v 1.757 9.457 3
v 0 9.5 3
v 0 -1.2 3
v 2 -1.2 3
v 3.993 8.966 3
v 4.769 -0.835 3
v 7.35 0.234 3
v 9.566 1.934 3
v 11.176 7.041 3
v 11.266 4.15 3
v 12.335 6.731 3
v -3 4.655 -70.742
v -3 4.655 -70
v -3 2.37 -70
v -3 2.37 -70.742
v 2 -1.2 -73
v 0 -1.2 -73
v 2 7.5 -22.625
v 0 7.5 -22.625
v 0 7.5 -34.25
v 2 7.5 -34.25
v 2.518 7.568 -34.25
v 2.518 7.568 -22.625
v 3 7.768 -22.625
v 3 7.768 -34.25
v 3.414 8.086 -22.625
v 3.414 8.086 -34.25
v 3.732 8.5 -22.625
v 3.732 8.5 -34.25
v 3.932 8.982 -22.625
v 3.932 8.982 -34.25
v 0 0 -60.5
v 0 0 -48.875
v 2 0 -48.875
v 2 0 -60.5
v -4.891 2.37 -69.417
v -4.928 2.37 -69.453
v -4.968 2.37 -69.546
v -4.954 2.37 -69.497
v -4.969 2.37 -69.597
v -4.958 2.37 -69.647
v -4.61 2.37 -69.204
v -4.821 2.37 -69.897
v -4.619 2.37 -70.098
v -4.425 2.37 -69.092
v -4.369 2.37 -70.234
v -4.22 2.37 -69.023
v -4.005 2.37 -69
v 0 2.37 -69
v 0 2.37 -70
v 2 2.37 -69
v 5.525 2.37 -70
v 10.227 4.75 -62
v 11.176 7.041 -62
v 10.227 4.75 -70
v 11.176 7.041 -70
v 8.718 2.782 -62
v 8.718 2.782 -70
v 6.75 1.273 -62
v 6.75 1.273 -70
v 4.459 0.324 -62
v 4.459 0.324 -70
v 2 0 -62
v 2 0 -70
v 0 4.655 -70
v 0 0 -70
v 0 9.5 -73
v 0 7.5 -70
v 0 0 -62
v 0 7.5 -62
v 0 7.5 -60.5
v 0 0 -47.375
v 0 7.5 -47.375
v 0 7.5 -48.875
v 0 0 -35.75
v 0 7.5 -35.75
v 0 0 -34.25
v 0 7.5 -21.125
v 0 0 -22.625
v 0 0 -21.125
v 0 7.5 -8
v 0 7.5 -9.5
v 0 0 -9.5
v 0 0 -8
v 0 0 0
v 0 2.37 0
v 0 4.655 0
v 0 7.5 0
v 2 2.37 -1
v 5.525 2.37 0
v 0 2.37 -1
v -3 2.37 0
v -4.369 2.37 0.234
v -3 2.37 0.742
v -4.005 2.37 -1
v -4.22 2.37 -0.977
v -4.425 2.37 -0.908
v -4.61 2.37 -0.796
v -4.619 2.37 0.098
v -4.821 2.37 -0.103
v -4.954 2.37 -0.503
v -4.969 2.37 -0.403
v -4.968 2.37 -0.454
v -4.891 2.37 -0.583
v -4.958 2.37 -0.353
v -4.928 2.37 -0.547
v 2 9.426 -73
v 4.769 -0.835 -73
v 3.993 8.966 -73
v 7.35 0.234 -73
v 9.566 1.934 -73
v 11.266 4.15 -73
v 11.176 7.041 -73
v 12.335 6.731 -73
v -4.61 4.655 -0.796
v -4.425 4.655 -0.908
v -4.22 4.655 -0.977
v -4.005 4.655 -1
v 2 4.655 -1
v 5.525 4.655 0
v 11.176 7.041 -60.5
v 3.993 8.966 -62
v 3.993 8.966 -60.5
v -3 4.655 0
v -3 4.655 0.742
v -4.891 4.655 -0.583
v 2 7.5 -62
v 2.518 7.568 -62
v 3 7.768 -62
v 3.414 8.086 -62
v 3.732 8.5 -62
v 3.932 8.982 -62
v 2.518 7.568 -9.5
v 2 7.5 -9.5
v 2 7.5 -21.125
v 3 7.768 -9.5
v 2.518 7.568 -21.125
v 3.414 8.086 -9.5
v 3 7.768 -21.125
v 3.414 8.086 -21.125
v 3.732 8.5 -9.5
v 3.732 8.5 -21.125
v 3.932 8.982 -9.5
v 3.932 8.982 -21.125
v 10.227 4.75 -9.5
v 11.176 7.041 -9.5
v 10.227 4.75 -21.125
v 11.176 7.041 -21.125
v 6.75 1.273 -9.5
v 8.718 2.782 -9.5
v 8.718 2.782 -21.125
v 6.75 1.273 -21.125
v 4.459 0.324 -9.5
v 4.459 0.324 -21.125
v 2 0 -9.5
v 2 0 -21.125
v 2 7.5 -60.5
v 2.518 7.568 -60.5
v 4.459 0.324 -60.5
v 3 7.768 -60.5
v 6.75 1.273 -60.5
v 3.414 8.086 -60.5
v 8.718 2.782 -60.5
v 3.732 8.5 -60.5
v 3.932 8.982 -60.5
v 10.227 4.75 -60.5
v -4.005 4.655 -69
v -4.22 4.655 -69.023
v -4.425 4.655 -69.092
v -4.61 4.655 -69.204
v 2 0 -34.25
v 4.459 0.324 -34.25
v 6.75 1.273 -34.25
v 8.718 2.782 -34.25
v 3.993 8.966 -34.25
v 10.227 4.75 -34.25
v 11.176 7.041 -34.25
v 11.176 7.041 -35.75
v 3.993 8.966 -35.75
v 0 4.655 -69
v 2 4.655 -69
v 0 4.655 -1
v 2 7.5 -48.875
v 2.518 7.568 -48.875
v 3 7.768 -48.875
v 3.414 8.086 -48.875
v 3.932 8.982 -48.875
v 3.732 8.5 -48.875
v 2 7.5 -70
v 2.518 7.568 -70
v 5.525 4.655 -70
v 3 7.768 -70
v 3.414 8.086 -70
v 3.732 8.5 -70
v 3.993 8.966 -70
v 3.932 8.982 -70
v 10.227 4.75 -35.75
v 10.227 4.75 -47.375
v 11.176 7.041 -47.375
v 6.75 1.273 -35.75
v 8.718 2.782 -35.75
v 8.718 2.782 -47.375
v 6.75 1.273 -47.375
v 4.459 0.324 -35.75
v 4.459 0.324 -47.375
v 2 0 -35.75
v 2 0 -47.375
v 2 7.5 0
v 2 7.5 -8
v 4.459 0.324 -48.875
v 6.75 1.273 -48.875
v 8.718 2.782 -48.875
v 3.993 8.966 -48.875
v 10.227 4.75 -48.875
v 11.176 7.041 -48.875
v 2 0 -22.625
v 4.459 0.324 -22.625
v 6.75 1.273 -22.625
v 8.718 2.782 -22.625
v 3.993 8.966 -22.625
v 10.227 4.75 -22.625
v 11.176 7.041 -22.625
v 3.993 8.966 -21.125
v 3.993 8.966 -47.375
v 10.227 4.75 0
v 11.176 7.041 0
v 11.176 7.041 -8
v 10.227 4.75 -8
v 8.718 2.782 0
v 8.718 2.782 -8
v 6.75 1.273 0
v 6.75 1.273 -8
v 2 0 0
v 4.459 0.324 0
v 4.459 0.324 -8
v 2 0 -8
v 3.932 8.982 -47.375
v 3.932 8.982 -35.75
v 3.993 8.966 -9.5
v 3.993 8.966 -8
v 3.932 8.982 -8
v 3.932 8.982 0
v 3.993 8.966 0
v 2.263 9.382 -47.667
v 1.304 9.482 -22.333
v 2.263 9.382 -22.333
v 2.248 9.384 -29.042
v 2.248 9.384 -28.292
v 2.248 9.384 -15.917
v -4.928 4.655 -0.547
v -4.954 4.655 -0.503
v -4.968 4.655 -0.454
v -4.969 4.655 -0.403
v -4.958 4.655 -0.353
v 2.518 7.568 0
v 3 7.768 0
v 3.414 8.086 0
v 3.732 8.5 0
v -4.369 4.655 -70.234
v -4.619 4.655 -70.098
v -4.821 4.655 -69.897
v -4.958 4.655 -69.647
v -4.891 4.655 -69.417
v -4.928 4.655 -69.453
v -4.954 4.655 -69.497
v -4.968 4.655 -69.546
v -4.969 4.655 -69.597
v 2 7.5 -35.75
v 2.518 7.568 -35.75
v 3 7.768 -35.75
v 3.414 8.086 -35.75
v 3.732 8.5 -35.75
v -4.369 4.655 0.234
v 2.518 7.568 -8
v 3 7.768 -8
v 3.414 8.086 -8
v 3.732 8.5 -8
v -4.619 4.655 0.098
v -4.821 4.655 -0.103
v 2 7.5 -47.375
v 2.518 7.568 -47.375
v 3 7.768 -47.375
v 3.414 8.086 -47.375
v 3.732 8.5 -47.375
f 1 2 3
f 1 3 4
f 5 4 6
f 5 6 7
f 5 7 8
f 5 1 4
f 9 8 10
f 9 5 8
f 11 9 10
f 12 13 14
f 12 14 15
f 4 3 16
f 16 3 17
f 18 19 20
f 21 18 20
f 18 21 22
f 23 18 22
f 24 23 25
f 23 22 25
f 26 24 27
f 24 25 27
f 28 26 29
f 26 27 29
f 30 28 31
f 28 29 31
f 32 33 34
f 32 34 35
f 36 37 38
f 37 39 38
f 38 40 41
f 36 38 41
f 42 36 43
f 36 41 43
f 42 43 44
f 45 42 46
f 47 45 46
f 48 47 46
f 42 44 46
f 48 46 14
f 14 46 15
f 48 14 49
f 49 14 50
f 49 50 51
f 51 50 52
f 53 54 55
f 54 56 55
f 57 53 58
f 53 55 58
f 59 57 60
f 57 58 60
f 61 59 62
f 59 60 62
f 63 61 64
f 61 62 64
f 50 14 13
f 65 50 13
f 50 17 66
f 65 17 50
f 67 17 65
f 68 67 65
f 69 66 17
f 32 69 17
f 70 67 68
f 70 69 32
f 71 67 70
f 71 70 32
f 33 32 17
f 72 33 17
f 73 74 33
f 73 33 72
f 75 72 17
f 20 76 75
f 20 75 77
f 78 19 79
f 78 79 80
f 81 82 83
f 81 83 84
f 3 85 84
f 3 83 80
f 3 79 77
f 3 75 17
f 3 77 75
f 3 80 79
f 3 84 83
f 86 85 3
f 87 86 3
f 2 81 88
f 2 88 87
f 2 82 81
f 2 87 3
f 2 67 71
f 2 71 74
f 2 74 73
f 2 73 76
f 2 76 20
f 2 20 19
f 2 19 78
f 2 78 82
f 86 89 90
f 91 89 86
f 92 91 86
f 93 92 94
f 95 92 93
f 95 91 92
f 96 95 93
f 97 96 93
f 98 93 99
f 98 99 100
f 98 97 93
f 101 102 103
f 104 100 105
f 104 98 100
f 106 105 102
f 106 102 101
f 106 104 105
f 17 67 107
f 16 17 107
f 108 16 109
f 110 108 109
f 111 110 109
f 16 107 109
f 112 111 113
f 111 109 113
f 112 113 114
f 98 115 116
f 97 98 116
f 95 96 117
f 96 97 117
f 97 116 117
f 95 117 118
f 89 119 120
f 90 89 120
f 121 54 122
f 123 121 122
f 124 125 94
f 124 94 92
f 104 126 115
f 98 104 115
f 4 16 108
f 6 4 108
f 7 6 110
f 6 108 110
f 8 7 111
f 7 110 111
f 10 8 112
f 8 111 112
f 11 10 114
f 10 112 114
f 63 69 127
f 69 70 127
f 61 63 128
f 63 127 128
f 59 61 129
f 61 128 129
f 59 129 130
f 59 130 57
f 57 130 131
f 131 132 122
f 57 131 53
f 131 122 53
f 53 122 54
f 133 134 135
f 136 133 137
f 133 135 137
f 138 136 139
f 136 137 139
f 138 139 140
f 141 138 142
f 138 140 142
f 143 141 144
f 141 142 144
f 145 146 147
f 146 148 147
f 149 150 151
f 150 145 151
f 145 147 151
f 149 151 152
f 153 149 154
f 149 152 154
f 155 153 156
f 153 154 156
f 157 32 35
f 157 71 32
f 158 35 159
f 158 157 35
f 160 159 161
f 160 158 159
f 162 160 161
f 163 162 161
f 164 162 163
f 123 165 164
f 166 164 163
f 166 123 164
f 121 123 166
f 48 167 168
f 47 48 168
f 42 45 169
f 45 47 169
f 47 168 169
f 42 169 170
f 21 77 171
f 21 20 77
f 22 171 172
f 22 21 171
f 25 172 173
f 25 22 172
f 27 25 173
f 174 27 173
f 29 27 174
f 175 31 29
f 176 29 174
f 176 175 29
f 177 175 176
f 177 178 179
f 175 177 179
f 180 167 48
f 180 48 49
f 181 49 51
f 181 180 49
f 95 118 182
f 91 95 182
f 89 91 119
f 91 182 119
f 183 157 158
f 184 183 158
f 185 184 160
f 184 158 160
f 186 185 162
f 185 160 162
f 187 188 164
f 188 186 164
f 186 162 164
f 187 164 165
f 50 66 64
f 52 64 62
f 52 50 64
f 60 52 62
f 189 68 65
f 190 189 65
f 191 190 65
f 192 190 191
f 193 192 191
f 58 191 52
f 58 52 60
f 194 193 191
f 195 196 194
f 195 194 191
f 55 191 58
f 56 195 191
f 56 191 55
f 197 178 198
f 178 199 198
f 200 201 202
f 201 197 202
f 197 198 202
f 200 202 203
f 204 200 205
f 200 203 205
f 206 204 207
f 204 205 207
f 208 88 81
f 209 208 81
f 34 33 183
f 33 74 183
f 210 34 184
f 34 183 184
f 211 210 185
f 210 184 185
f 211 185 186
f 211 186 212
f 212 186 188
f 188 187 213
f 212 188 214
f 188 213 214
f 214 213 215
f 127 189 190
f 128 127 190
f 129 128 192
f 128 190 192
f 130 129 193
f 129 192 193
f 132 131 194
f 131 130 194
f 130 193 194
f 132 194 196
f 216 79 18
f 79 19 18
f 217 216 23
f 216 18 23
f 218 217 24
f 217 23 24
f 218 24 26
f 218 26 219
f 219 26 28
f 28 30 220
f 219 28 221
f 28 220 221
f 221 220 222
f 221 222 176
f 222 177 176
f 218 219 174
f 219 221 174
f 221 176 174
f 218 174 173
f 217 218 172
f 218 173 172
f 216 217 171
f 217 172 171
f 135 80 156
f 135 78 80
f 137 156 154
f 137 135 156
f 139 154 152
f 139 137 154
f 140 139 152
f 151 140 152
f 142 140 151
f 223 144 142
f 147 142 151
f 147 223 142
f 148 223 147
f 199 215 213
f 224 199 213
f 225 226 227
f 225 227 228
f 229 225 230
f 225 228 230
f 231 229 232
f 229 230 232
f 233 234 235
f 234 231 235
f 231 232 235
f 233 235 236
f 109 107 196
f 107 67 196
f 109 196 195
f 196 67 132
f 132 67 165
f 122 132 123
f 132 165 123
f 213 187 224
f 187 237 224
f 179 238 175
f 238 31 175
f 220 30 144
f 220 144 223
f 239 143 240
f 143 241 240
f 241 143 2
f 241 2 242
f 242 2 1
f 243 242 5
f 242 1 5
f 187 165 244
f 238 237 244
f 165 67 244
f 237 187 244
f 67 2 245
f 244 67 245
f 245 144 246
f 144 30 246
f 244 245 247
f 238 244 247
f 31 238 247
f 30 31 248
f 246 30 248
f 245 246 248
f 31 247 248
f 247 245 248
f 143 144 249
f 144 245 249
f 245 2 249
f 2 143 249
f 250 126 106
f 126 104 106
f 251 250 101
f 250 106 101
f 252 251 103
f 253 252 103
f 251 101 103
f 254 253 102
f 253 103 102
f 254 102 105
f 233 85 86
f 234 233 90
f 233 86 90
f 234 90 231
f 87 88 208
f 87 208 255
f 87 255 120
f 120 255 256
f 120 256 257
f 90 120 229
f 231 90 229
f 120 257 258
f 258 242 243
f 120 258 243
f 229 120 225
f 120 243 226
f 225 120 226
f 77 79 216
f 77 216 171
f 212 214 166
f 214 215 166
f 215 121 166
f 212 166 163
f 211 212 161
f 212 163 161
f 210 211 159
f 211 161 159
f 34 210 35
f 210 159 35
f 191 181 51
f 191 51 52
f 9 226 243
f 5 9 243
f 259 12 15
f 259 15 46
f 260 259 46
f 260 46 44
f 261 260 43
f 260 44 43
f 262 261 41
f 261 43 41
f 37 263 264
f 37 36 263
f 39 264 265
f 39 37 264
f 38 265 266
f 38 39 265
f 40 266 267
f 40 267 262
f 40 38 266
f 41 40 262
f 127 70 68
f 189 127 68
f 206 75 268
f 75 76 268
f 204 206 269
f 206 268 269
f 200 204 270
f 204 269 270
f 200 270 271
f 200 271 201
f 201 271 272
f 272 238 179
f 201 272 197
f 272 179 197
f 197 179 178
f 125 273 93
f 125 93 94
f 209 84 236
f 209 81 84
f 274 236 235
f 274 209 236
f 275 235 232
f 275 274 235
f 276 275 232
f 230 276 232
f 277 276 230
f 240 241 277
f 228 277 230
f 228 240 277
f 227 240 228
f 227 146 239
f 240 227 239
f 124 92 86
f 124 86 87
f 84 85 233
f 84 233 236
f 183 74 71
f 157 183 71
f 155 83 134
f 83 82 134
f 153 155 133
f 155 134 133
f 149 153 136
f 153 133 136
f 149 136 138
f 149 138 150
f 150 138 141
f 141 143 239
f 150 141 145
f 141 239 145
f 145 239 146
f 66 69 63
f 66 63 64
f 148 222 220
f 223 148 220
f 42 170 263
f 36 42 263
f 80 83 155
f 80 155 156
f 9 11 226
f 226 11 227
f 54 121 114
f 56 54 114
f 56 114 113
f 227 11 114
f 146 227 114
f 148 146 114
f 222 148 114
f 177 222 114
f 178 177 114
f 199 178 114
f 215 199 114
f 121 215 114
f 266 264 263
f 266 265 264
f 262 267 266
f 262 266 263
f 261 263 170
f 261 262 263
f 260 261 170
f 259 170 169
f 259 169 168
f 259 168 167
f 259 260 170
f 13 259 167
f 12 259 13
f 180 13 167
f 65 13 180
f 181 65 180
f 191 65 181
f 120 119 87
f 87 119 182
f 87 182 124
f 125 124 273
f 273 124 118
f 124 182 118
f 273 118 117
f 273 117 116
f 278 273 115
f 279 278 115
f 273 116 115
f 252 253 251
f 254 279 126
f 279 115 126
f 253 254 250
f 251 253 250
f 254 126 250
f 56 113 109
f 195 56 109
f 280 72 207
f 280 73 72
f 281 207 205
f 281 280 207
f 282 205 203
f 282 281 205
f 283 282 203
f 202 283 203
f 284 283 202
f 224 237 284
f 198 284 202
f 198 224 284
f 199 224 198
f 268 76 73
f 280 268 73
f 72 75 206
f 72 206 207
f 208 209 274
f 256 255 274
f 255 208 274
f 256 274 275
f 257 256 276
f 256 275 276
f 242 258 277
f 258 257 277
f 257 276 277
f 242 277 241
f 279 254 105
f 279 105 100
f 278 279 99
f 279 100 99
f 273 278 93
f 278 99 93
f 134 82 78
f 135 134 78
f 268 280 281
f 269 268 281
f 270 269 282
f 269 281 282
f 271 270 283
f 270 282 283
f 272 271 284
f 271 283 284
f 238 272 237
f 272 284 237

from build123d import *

# Parameters (mm, degrees)
SKETCH1_W             = 70
SKETCH1_H             = 7.5
SKETCH1_W_2           = 1.5
BOSS_EXTRUDE1_DEPTH   = 2
SWEEP1_START          = -73
SWEEP1_DEPTH          = 76
SWEEP1_2_DEPTH        = 3
SWEEP1_3_DEPTH        = 3
SWEEP1_START_2        = -62
SWEEP1_4_DEPTH        = 1.5
SWEEP1_START_3        = -48.875
SWEEP1_5_DEPTH        = 1.5
SWEEP1_START_4        = -35.75
SWEEP1_6_DEPTH        = 1.5
SWEEP1_START_5        = -22.625
SWEEP1_7_DEPTH        = 1.5
SWEEP1_START_6        = -9.5
SWEEP1_8_DEPTH        = 1.5
CUT_EXTRUDE1_DEPTH    = 80
SKETCH4_W             = 1
SKETCH4_H             = 2.284825157
BOSS_EXTRUDE2_DEPTH   = 5
BOSS_EXTRUDE2_2_DEPTH = 5
CUT_EXTRUDE2_DEPTH    = 5
BOSS_EXTRUDE3_DEPTH   = 2.284825157
BOSS_EXTRUDE4_DEPTH   = 2.284825157
FILLET1_R             = 1
FILLET2_R             = 0.2


# Read off the part's stored shape, not the designer's step: Sweep1
with BuildPart() as part:
    # Sketch1 → Boss-Extrude1 (new body)
    # profile 1 of 6: a face of its own
    with BuildSketch(Plane(origin=(0, 0, 0), x_dir=(0, 0, -1), z_dir=(1, 0, 0))):
        Polygon((73, 9.5), (73, 7.5), (73, 0), (73, -1.2), (70, -1.2), (-3, -1.2), (-3, 9.5), (70, 9.5), align=None)
        with Locations((35, 3.75)):
            Rectangle(SKETCH1_W, SKETCH1_H, mode=Mode.SUBTRACT)
    # profile 2 of 6: a face of its own
    with BuildSketch(Plane(origin=(0, 0, 0), x_dir=(0, 0, -1), z_dir=(1, 0, 0))):
        with Locations((8.75, 3.75)):
            Rectangle(SKETCH1_W_2, SKETCH1_H)
    # profile 3 of 6: a face of its own
    with BuildSketch(Plane(origin=(0, 0, 0), x_dir=(0, 0, -1), z_dir=(1, 0, 0))):
        with Locations((21.875, 3.75)):
            Rectangle(SKETCH1_W_2, SKETCH1_H)
    # profile 4 of 6: a face of its own
    with BuildSketch(Plane(origin=(0, 0, 0), x_dir=(0, 0, -1), z_dir=(1, 0, 0))):
        with Locations((35, 3.75)):
            Rectangle(SKETCH1_W_2, SKETCH1_H)
    # profile 5 of 6: a face of its own
    with BuildSketch(Plane(origin=(0, 0, 0), x_dir=(0, 0, -1), z_dir=(1, 0, 0))):
        with Locations((48.125, 3.75)):
            Rectangle(SKETCH1_W_2, SKETCH1_H)
    # profile 6 of 6: a face of its own
    with BuildSketch(Plane(origin=(0, 0, 0), x_dir=(0, 0, -1), z_dir=(1, 0, 0))):
        with Locations((61.25, 3.75)):
            Rectangle(SKETCH1_W_2, SKETCH1_H)
    extrude(amount=BOSS_EXTRUDE1_DEPTH)

    # Sweep1 outline → Sweep1 (add)
    with BuildSketch(Plane.XY.offset(SWEEP1_START)):
        with BuildLine():
            Line((2, 0), (2, -1.2))
            ThreePointArc((2, -1.2), (8.51374729, 1.011119259), (12.335406341, 6.730636217))
            Line((12.335406341, 6.730636217), (11.17629535, 7.041219072))
            ThreePointArc((11.17629535, 7.041219072), (7.783233576, 1.963143267), (2, 0))
        make_face()
        with BuildLine():
            Line((2, 9.5), (2, 7.5))
            ThreePointArc((2, 7.5), (3.217522858, 7.913293319), (3.931851653, 8.98236191))
            Line((3.931851653, 8.98236191), (2, 9.5))
        make_face()
    extrude(amount=SWEEP1_DEPTH)

    # Sweep1 2 outline → Sweep1 2 (add)
    with BuildSketch(Plane.XY.offset(SWEEP1_START)):
        with BuildLine():
            Line((2, 7.5), (2, 0))
            ThreePointArc((2, 0), (7.783233576, 1.963143267), (11.17629535, 7.041219072))
            Line((11.17629535, 7.041219072), (3.931851653, 8.98236191))
            ThreePointArc((3.931851653, 8.98236191), (3.217522858, 7.913293319), (2, 7.5))
        make_face()
    extrude(amount=SWEEP1_2_DEPTH)

    # Sweep1 3 outline → Sweep1 3 (add)
    with BuildSketch(Plane.XY):
        with BuildLine():
            Line((2, 7.5), (2, 0))
            ThreePointArc((2, 0), (7.783233576, 1.963143267), (11.17629535, 7.041219072))
            Line((11.17629535, 7.041219072), (3.931851653, 8.98236191))
            ThreePointArc((3.931851653, 8.98236191), (3.217522858, 7.913293319), (2, 7.5))
        make_face()
    extrude(amount=SWEEP1_3_DEPTH)

    # Sweep1 4 outline → Sweep1 4 (add)
    with BuildSketch(Plane.XY.offset(SWEEP1_START_2)):
        with BuildLine():
            Line((2, 7.5), (2, 0))
            ThreePointArc((2, 0), (7.783233576, 1.963143267), (11.17629535, 7.041219072))
            Line((11.17629535, 7.041219072), (3.931851653, 8.98236191))
            ThreePointArc((3.931851653, 8.98236191), (3.217522858, 7.913293319), (2, 7.5))
        make_face()
    extrude(amount=SWEEP1_4_DEPTH)

    # Sweep1 5 outline → Sweep1 5 (add)
    with BuildSketch(Plane.XY.offset(SWEEP1_START_3)):
        with BuildLine():
            Line((2, 7.5), (2, 0))
            ThreePointArc((2, 0), (7.783233576, 1.963143267), (11.17629535, 7.041219072))
            Line((11.17629535, 7.041219072), (3.931851653, 8.98236191))
            ThreePointArc((3.931851653, 8.98236191), (3.217522858, 7.913293319), (2, 7.5))
        make_face()
    extrude(amount=SWEEP1_5_DEPTH)

    # Sweep1 6 outline → Sweep1 6 (add)
    with BuildSketch(Plane.XY.offset(SWEEP1_START_4)):
        with BuildLine():
            Line((2, 7.5), (2, 0))
            ThreePointArc((2, 0), (7.783233576, 1.963143267), (11.17629535, 7.041219072))
            Line((11.17629535, 7.041219072), (3.931851653, 8.98236191))
            ThreePointArc((3.931851653, 8.98236191), (3.217522858, 7.913293319), (2, 7.5))
        make_face()
    extrude(amount=SWEEP1_6_DEPTH)

    # Sweep1 7 outline → Sweep1 7 (add)
    with BuildSketch(Plane.XY.offset(SWEEP1_START_5)):
        with BuildLine():
            Line((2, 7.5), (2, 0))
            ThreePointArc((2, 0), (7.783233576, 1.963143267), (11.17629535, 7.041219072))
            Line((11.17629535, 7.041219072), (3.931851653, 8.98236191))
            ThreePointArc((3.931851653, 8.98236191), (3.217522858, 7.913293319), (2, 7.5))
        make_face()
    extrude(amount=SWEEP1_7_DEPTH)

    # Sweep1 8 outline → Sweep1 8 (add)
    with BuildSketch(Plane.XY.offset(SWEEP1_START_6)):
        with BuildLine():
            Line((2, 7.5), (2, 0))
            ThreePointArc((2, 0), (7.783233576, 1.963143267), (11.17629535, 7.041219072))
            Line((11.17629535, 7.041219072), (3.931851653, 8.98236191))
            ThreePointArc((3.931851653, 8.98236191), (3.217522858, 7.913293319), (2, 7.5))
        make_face()
    extrude(amount=SWEEP1_8_DEPTH)

    # Sketch3 → Cut-Extrude1 (cut)
    with BuildSketch(Plane.XY.offset(3)):
        with BuildLine():
            add(Edge.make_bspline(
                [(0, 9.5), (1.85008807, 9.446594219), (1.503968772, 9.616267019), (3.992528633, 8.966103562)],
                knots=[0, 0, 0, 0, 1, 1, 1, 1], degree=3))
            Line((3.992528633, 8.966103562), (2, 9.5))
            Line((2, 9.5), (0, 9.5))
        make_face()
    extrude(amount=-CUT_EXTRUDE1_DEPTH, mode=Mode.SUBTRACT)



with BuildPart() as body_2:
    # Sketch4 → Boss-Extrude2 (new body)
    with BuildSketch(Plane.ZY):
        with Locations((-69.5, 3.512617973)):
            Rectangle(SKETCH4_W, SKETCH4_H)
    extrude(amount=BOSS_EXTRUDE2_DEPTH)


with BuildPart() as body_3:
    # Sketch4 → Boss-Extrude2 2 (new body)
    with BuildSketch(Plane.ZY):
        with Locations((-0.5, 3.512617973)):
            Rectangle(SKETCH4_W, SKETCH4_H)
    extrude(amount=BOSS_EXTRUDE2_2_DEPTH)


with BuildPart() as cut_extrude2_tool:
    # Sketch5 → Cut-Extrude2 (new body)
    with BuildSketch(Plane(origin=(0, 4.655030551, 0), x_dir=(1, 0, 0), z_dir=(0, 1, 0))):
        Polygon((-4.341933066, 69), (-5, 69.5), (-5, 69), align=None)
        Polygon((-5, 1), (-5, 0.5), (-4.341933066, 1), align=None)
    extrude(amount=-CUT_EXTRUDE2_DEPTH)


with BuildPart() as body_2_1:
    add(body_2.part)

    # Cut-Extrude2: cut by cut_extrude2_tool
    add(cut_extrude2_tool.part, mode=Mode.SUBTRACT)



with BuildPart() as body_3_1:
    add(body_3.part)

    # Cut-Extrude2: cut by cut_extrude2_tool
    add(cut_extrude2_tool.part, mode=Mode.SUBTRACT)


with BuildPart() as body_2_2:
    add(body_2_1.part)

    add(body_3_1.part)  # Boss-Extrude3 merges body 3
    # Sketch6 → Boss-Extrude3 (add)
    with BuildSketch(Plane(origin=(0, 4.655030551, 0), x_dir=(1, 0, 0), z_dir=(0, 1, 0))):
        Polygon((-3, 70.742293059), (-5, 70), (-3, 70), align=None)
        Polygon((-3, 0), (-5, 0), (-3, -0.742293059), align=None)
    extrude(amount=-BOSS_EXTRUDE3_DEPTH)


with BuildPart() as part_1:
    add(part.part)

    add(body_2_2.part)  # Boss-Extrude4 merges body 2
    # Sketch7 → Boss-Extrude4 (add)
    with BuildSketch(Plane(origin=(0, 4.655030551, 0), x_dir=(1, 0, 0), z_dir=(0, 1, 0))):
        Polygon((0, 69), (2, 69), (5.524751143, 70), (0, 70), align=None)
        Polygon((0, 0), (0, 1), (2, 1), (5.524751143, 0), align=None)
    extrude(amount=-BOSS_EXTRUDE4_DEPTH)

    # Fillet1
    # the kernel refuses this fillet: 1 mm, written as the material it takes off along each edge
    with BuildSketch(Plane(origin=(-4.341933066, 5.497044152, -69), x_dir=(1, 0, 0), z_dir=(0, -1, 0))) as fillet1_piece_1:
        with BuildLine():
            CenterArc((FILLET1_R * 0.336805440666, -FILLET1_R), FILLET1_R, 90, 37.22761065)
            Line((-FILLET1_R * 0.268177449166, -FILLET1_R * 0.203761528805), (-FILLET1_R * 0.280277106962, -FILLET1_R * 0.187836759381))
            Line((-FILLET1_R * 0.280277106962, -FILLET1_R * 0.187836759381), (-FILLET1_R * 0.00673610881331, FILLET1_R * 0.02))
            Line((-FILLET1_R * 0.00673610881331, FILLET1_R * 0.02), (FILLET1_R * 0.336805440666, FILLET1_R * 0.02))
            Line((FILLET1_R * 0.336805440666, FILLET1_R * 0.02), (FILLET1_R * 0.336805440666, 0))
        make_face()
    extrude(amount=3.96885236, mode=Mode.SUBTRACT)
    with BuildSketch(Plane(origin=(-5, 0.687101271, -70), x_dir=(0, 0, 1), z_dir=(0, 1, 0))) as fillet1_piece_2:
        with BuildLine():
            CenterArc((0.703254318, 0.979125979), FILLET1_R, 200.362233207, 57.910439257)
            Line((-0.234257231, 0.631171821), (-0.253007462, 0.624212738))
            Line((-0.253007462, 0.624212738), (-0.018750231, -0.006959083))
            Line((-0.018750231, -0.006959083), (0, -0.02))
            ThreePointArc((0, -0.02), (0.25, -0.02), (0.495934914, -0.01958252))
            Line((0.495934914, -0.01958252), (0.5, 0))
        make_face()
    extrude(amount=5.651033402, mode=Mode.SUBTRACT)
    with BuildSketch(Plane(origin=(-5, 0.687101271, 0), x_dir=(0, 0, -1), z_dir=(0, 1, 0))) as fillet1_piece_3:
        with BuildLine():
            CenterArc((0.703254318, -0.979125979), FILLET1_R, 101.727327536, 57.910439257)
            Line((-0.234257231, -0.631171821), (-0.253007462, -0.624212738))
            Line((-0.253007462, -0.624212738), (-0.018750231, 0.006959083))
            Line((-0.018750231, 0.006959083), (0, 0.02))
            ThreePointArc((0, 0.02), (0.25, 0.02), (0.495934914, 0.01958252))
            Line((0.495934914, 0.01958252), (0.5, 0))
        make_face()
    extrude(amount=5.651033402, mode=Mode.SUBTRACT)
    with BuildSketch(Plane(origin=(-4.341933066, 5.497044152, -1), x_dir=(1, 0, 0), z_dir=(0, -1, 0))) as fillet1_piece_4:
        with BuildLine():
            CenterArc((FILLET1_R * 0.336805440666, FILLET1_R), FILLET1_R, 232.77238935, 37.22761065)
            Line((-FILLET1_R * 0.268177449166, FILLET1_R * 0.203761528805), (-FILLET1_R * 0.280277106962, FILLET1_R * 0.187836759381))
            Line((-FILLET1_R * 0.280277106962, FILLET1_R * 0.187836759381), (-FILLET1_R * 0.00673610881331, -FILLET1_R * 0.02))
            Line((-FILLET1_R * 0.00673610881331, -FILLET1_R * 0.02), (FILLET1_R * 0.336805440666, -FILLET1_R * 0.02))
            Line((FILLET1_R * 0.336805440666, -FILLET1_R * 0.02), (FILLET1_R * 0.336805440666, 0))
        make_face()
    extrude(amount=3.96885236, mode=Mode.SUBTRACT)

    # Fillet2
    fillet2_edges = [part_1.edges().sort_by_distance(p)[0] for p in [
        (-5, 3.512617972, -69.5),
        (-5, 3.512617972, -0.5),
    ]]
    fillet(fillet2_edges, radius=FILLET2_R)


solid = part_1.part
